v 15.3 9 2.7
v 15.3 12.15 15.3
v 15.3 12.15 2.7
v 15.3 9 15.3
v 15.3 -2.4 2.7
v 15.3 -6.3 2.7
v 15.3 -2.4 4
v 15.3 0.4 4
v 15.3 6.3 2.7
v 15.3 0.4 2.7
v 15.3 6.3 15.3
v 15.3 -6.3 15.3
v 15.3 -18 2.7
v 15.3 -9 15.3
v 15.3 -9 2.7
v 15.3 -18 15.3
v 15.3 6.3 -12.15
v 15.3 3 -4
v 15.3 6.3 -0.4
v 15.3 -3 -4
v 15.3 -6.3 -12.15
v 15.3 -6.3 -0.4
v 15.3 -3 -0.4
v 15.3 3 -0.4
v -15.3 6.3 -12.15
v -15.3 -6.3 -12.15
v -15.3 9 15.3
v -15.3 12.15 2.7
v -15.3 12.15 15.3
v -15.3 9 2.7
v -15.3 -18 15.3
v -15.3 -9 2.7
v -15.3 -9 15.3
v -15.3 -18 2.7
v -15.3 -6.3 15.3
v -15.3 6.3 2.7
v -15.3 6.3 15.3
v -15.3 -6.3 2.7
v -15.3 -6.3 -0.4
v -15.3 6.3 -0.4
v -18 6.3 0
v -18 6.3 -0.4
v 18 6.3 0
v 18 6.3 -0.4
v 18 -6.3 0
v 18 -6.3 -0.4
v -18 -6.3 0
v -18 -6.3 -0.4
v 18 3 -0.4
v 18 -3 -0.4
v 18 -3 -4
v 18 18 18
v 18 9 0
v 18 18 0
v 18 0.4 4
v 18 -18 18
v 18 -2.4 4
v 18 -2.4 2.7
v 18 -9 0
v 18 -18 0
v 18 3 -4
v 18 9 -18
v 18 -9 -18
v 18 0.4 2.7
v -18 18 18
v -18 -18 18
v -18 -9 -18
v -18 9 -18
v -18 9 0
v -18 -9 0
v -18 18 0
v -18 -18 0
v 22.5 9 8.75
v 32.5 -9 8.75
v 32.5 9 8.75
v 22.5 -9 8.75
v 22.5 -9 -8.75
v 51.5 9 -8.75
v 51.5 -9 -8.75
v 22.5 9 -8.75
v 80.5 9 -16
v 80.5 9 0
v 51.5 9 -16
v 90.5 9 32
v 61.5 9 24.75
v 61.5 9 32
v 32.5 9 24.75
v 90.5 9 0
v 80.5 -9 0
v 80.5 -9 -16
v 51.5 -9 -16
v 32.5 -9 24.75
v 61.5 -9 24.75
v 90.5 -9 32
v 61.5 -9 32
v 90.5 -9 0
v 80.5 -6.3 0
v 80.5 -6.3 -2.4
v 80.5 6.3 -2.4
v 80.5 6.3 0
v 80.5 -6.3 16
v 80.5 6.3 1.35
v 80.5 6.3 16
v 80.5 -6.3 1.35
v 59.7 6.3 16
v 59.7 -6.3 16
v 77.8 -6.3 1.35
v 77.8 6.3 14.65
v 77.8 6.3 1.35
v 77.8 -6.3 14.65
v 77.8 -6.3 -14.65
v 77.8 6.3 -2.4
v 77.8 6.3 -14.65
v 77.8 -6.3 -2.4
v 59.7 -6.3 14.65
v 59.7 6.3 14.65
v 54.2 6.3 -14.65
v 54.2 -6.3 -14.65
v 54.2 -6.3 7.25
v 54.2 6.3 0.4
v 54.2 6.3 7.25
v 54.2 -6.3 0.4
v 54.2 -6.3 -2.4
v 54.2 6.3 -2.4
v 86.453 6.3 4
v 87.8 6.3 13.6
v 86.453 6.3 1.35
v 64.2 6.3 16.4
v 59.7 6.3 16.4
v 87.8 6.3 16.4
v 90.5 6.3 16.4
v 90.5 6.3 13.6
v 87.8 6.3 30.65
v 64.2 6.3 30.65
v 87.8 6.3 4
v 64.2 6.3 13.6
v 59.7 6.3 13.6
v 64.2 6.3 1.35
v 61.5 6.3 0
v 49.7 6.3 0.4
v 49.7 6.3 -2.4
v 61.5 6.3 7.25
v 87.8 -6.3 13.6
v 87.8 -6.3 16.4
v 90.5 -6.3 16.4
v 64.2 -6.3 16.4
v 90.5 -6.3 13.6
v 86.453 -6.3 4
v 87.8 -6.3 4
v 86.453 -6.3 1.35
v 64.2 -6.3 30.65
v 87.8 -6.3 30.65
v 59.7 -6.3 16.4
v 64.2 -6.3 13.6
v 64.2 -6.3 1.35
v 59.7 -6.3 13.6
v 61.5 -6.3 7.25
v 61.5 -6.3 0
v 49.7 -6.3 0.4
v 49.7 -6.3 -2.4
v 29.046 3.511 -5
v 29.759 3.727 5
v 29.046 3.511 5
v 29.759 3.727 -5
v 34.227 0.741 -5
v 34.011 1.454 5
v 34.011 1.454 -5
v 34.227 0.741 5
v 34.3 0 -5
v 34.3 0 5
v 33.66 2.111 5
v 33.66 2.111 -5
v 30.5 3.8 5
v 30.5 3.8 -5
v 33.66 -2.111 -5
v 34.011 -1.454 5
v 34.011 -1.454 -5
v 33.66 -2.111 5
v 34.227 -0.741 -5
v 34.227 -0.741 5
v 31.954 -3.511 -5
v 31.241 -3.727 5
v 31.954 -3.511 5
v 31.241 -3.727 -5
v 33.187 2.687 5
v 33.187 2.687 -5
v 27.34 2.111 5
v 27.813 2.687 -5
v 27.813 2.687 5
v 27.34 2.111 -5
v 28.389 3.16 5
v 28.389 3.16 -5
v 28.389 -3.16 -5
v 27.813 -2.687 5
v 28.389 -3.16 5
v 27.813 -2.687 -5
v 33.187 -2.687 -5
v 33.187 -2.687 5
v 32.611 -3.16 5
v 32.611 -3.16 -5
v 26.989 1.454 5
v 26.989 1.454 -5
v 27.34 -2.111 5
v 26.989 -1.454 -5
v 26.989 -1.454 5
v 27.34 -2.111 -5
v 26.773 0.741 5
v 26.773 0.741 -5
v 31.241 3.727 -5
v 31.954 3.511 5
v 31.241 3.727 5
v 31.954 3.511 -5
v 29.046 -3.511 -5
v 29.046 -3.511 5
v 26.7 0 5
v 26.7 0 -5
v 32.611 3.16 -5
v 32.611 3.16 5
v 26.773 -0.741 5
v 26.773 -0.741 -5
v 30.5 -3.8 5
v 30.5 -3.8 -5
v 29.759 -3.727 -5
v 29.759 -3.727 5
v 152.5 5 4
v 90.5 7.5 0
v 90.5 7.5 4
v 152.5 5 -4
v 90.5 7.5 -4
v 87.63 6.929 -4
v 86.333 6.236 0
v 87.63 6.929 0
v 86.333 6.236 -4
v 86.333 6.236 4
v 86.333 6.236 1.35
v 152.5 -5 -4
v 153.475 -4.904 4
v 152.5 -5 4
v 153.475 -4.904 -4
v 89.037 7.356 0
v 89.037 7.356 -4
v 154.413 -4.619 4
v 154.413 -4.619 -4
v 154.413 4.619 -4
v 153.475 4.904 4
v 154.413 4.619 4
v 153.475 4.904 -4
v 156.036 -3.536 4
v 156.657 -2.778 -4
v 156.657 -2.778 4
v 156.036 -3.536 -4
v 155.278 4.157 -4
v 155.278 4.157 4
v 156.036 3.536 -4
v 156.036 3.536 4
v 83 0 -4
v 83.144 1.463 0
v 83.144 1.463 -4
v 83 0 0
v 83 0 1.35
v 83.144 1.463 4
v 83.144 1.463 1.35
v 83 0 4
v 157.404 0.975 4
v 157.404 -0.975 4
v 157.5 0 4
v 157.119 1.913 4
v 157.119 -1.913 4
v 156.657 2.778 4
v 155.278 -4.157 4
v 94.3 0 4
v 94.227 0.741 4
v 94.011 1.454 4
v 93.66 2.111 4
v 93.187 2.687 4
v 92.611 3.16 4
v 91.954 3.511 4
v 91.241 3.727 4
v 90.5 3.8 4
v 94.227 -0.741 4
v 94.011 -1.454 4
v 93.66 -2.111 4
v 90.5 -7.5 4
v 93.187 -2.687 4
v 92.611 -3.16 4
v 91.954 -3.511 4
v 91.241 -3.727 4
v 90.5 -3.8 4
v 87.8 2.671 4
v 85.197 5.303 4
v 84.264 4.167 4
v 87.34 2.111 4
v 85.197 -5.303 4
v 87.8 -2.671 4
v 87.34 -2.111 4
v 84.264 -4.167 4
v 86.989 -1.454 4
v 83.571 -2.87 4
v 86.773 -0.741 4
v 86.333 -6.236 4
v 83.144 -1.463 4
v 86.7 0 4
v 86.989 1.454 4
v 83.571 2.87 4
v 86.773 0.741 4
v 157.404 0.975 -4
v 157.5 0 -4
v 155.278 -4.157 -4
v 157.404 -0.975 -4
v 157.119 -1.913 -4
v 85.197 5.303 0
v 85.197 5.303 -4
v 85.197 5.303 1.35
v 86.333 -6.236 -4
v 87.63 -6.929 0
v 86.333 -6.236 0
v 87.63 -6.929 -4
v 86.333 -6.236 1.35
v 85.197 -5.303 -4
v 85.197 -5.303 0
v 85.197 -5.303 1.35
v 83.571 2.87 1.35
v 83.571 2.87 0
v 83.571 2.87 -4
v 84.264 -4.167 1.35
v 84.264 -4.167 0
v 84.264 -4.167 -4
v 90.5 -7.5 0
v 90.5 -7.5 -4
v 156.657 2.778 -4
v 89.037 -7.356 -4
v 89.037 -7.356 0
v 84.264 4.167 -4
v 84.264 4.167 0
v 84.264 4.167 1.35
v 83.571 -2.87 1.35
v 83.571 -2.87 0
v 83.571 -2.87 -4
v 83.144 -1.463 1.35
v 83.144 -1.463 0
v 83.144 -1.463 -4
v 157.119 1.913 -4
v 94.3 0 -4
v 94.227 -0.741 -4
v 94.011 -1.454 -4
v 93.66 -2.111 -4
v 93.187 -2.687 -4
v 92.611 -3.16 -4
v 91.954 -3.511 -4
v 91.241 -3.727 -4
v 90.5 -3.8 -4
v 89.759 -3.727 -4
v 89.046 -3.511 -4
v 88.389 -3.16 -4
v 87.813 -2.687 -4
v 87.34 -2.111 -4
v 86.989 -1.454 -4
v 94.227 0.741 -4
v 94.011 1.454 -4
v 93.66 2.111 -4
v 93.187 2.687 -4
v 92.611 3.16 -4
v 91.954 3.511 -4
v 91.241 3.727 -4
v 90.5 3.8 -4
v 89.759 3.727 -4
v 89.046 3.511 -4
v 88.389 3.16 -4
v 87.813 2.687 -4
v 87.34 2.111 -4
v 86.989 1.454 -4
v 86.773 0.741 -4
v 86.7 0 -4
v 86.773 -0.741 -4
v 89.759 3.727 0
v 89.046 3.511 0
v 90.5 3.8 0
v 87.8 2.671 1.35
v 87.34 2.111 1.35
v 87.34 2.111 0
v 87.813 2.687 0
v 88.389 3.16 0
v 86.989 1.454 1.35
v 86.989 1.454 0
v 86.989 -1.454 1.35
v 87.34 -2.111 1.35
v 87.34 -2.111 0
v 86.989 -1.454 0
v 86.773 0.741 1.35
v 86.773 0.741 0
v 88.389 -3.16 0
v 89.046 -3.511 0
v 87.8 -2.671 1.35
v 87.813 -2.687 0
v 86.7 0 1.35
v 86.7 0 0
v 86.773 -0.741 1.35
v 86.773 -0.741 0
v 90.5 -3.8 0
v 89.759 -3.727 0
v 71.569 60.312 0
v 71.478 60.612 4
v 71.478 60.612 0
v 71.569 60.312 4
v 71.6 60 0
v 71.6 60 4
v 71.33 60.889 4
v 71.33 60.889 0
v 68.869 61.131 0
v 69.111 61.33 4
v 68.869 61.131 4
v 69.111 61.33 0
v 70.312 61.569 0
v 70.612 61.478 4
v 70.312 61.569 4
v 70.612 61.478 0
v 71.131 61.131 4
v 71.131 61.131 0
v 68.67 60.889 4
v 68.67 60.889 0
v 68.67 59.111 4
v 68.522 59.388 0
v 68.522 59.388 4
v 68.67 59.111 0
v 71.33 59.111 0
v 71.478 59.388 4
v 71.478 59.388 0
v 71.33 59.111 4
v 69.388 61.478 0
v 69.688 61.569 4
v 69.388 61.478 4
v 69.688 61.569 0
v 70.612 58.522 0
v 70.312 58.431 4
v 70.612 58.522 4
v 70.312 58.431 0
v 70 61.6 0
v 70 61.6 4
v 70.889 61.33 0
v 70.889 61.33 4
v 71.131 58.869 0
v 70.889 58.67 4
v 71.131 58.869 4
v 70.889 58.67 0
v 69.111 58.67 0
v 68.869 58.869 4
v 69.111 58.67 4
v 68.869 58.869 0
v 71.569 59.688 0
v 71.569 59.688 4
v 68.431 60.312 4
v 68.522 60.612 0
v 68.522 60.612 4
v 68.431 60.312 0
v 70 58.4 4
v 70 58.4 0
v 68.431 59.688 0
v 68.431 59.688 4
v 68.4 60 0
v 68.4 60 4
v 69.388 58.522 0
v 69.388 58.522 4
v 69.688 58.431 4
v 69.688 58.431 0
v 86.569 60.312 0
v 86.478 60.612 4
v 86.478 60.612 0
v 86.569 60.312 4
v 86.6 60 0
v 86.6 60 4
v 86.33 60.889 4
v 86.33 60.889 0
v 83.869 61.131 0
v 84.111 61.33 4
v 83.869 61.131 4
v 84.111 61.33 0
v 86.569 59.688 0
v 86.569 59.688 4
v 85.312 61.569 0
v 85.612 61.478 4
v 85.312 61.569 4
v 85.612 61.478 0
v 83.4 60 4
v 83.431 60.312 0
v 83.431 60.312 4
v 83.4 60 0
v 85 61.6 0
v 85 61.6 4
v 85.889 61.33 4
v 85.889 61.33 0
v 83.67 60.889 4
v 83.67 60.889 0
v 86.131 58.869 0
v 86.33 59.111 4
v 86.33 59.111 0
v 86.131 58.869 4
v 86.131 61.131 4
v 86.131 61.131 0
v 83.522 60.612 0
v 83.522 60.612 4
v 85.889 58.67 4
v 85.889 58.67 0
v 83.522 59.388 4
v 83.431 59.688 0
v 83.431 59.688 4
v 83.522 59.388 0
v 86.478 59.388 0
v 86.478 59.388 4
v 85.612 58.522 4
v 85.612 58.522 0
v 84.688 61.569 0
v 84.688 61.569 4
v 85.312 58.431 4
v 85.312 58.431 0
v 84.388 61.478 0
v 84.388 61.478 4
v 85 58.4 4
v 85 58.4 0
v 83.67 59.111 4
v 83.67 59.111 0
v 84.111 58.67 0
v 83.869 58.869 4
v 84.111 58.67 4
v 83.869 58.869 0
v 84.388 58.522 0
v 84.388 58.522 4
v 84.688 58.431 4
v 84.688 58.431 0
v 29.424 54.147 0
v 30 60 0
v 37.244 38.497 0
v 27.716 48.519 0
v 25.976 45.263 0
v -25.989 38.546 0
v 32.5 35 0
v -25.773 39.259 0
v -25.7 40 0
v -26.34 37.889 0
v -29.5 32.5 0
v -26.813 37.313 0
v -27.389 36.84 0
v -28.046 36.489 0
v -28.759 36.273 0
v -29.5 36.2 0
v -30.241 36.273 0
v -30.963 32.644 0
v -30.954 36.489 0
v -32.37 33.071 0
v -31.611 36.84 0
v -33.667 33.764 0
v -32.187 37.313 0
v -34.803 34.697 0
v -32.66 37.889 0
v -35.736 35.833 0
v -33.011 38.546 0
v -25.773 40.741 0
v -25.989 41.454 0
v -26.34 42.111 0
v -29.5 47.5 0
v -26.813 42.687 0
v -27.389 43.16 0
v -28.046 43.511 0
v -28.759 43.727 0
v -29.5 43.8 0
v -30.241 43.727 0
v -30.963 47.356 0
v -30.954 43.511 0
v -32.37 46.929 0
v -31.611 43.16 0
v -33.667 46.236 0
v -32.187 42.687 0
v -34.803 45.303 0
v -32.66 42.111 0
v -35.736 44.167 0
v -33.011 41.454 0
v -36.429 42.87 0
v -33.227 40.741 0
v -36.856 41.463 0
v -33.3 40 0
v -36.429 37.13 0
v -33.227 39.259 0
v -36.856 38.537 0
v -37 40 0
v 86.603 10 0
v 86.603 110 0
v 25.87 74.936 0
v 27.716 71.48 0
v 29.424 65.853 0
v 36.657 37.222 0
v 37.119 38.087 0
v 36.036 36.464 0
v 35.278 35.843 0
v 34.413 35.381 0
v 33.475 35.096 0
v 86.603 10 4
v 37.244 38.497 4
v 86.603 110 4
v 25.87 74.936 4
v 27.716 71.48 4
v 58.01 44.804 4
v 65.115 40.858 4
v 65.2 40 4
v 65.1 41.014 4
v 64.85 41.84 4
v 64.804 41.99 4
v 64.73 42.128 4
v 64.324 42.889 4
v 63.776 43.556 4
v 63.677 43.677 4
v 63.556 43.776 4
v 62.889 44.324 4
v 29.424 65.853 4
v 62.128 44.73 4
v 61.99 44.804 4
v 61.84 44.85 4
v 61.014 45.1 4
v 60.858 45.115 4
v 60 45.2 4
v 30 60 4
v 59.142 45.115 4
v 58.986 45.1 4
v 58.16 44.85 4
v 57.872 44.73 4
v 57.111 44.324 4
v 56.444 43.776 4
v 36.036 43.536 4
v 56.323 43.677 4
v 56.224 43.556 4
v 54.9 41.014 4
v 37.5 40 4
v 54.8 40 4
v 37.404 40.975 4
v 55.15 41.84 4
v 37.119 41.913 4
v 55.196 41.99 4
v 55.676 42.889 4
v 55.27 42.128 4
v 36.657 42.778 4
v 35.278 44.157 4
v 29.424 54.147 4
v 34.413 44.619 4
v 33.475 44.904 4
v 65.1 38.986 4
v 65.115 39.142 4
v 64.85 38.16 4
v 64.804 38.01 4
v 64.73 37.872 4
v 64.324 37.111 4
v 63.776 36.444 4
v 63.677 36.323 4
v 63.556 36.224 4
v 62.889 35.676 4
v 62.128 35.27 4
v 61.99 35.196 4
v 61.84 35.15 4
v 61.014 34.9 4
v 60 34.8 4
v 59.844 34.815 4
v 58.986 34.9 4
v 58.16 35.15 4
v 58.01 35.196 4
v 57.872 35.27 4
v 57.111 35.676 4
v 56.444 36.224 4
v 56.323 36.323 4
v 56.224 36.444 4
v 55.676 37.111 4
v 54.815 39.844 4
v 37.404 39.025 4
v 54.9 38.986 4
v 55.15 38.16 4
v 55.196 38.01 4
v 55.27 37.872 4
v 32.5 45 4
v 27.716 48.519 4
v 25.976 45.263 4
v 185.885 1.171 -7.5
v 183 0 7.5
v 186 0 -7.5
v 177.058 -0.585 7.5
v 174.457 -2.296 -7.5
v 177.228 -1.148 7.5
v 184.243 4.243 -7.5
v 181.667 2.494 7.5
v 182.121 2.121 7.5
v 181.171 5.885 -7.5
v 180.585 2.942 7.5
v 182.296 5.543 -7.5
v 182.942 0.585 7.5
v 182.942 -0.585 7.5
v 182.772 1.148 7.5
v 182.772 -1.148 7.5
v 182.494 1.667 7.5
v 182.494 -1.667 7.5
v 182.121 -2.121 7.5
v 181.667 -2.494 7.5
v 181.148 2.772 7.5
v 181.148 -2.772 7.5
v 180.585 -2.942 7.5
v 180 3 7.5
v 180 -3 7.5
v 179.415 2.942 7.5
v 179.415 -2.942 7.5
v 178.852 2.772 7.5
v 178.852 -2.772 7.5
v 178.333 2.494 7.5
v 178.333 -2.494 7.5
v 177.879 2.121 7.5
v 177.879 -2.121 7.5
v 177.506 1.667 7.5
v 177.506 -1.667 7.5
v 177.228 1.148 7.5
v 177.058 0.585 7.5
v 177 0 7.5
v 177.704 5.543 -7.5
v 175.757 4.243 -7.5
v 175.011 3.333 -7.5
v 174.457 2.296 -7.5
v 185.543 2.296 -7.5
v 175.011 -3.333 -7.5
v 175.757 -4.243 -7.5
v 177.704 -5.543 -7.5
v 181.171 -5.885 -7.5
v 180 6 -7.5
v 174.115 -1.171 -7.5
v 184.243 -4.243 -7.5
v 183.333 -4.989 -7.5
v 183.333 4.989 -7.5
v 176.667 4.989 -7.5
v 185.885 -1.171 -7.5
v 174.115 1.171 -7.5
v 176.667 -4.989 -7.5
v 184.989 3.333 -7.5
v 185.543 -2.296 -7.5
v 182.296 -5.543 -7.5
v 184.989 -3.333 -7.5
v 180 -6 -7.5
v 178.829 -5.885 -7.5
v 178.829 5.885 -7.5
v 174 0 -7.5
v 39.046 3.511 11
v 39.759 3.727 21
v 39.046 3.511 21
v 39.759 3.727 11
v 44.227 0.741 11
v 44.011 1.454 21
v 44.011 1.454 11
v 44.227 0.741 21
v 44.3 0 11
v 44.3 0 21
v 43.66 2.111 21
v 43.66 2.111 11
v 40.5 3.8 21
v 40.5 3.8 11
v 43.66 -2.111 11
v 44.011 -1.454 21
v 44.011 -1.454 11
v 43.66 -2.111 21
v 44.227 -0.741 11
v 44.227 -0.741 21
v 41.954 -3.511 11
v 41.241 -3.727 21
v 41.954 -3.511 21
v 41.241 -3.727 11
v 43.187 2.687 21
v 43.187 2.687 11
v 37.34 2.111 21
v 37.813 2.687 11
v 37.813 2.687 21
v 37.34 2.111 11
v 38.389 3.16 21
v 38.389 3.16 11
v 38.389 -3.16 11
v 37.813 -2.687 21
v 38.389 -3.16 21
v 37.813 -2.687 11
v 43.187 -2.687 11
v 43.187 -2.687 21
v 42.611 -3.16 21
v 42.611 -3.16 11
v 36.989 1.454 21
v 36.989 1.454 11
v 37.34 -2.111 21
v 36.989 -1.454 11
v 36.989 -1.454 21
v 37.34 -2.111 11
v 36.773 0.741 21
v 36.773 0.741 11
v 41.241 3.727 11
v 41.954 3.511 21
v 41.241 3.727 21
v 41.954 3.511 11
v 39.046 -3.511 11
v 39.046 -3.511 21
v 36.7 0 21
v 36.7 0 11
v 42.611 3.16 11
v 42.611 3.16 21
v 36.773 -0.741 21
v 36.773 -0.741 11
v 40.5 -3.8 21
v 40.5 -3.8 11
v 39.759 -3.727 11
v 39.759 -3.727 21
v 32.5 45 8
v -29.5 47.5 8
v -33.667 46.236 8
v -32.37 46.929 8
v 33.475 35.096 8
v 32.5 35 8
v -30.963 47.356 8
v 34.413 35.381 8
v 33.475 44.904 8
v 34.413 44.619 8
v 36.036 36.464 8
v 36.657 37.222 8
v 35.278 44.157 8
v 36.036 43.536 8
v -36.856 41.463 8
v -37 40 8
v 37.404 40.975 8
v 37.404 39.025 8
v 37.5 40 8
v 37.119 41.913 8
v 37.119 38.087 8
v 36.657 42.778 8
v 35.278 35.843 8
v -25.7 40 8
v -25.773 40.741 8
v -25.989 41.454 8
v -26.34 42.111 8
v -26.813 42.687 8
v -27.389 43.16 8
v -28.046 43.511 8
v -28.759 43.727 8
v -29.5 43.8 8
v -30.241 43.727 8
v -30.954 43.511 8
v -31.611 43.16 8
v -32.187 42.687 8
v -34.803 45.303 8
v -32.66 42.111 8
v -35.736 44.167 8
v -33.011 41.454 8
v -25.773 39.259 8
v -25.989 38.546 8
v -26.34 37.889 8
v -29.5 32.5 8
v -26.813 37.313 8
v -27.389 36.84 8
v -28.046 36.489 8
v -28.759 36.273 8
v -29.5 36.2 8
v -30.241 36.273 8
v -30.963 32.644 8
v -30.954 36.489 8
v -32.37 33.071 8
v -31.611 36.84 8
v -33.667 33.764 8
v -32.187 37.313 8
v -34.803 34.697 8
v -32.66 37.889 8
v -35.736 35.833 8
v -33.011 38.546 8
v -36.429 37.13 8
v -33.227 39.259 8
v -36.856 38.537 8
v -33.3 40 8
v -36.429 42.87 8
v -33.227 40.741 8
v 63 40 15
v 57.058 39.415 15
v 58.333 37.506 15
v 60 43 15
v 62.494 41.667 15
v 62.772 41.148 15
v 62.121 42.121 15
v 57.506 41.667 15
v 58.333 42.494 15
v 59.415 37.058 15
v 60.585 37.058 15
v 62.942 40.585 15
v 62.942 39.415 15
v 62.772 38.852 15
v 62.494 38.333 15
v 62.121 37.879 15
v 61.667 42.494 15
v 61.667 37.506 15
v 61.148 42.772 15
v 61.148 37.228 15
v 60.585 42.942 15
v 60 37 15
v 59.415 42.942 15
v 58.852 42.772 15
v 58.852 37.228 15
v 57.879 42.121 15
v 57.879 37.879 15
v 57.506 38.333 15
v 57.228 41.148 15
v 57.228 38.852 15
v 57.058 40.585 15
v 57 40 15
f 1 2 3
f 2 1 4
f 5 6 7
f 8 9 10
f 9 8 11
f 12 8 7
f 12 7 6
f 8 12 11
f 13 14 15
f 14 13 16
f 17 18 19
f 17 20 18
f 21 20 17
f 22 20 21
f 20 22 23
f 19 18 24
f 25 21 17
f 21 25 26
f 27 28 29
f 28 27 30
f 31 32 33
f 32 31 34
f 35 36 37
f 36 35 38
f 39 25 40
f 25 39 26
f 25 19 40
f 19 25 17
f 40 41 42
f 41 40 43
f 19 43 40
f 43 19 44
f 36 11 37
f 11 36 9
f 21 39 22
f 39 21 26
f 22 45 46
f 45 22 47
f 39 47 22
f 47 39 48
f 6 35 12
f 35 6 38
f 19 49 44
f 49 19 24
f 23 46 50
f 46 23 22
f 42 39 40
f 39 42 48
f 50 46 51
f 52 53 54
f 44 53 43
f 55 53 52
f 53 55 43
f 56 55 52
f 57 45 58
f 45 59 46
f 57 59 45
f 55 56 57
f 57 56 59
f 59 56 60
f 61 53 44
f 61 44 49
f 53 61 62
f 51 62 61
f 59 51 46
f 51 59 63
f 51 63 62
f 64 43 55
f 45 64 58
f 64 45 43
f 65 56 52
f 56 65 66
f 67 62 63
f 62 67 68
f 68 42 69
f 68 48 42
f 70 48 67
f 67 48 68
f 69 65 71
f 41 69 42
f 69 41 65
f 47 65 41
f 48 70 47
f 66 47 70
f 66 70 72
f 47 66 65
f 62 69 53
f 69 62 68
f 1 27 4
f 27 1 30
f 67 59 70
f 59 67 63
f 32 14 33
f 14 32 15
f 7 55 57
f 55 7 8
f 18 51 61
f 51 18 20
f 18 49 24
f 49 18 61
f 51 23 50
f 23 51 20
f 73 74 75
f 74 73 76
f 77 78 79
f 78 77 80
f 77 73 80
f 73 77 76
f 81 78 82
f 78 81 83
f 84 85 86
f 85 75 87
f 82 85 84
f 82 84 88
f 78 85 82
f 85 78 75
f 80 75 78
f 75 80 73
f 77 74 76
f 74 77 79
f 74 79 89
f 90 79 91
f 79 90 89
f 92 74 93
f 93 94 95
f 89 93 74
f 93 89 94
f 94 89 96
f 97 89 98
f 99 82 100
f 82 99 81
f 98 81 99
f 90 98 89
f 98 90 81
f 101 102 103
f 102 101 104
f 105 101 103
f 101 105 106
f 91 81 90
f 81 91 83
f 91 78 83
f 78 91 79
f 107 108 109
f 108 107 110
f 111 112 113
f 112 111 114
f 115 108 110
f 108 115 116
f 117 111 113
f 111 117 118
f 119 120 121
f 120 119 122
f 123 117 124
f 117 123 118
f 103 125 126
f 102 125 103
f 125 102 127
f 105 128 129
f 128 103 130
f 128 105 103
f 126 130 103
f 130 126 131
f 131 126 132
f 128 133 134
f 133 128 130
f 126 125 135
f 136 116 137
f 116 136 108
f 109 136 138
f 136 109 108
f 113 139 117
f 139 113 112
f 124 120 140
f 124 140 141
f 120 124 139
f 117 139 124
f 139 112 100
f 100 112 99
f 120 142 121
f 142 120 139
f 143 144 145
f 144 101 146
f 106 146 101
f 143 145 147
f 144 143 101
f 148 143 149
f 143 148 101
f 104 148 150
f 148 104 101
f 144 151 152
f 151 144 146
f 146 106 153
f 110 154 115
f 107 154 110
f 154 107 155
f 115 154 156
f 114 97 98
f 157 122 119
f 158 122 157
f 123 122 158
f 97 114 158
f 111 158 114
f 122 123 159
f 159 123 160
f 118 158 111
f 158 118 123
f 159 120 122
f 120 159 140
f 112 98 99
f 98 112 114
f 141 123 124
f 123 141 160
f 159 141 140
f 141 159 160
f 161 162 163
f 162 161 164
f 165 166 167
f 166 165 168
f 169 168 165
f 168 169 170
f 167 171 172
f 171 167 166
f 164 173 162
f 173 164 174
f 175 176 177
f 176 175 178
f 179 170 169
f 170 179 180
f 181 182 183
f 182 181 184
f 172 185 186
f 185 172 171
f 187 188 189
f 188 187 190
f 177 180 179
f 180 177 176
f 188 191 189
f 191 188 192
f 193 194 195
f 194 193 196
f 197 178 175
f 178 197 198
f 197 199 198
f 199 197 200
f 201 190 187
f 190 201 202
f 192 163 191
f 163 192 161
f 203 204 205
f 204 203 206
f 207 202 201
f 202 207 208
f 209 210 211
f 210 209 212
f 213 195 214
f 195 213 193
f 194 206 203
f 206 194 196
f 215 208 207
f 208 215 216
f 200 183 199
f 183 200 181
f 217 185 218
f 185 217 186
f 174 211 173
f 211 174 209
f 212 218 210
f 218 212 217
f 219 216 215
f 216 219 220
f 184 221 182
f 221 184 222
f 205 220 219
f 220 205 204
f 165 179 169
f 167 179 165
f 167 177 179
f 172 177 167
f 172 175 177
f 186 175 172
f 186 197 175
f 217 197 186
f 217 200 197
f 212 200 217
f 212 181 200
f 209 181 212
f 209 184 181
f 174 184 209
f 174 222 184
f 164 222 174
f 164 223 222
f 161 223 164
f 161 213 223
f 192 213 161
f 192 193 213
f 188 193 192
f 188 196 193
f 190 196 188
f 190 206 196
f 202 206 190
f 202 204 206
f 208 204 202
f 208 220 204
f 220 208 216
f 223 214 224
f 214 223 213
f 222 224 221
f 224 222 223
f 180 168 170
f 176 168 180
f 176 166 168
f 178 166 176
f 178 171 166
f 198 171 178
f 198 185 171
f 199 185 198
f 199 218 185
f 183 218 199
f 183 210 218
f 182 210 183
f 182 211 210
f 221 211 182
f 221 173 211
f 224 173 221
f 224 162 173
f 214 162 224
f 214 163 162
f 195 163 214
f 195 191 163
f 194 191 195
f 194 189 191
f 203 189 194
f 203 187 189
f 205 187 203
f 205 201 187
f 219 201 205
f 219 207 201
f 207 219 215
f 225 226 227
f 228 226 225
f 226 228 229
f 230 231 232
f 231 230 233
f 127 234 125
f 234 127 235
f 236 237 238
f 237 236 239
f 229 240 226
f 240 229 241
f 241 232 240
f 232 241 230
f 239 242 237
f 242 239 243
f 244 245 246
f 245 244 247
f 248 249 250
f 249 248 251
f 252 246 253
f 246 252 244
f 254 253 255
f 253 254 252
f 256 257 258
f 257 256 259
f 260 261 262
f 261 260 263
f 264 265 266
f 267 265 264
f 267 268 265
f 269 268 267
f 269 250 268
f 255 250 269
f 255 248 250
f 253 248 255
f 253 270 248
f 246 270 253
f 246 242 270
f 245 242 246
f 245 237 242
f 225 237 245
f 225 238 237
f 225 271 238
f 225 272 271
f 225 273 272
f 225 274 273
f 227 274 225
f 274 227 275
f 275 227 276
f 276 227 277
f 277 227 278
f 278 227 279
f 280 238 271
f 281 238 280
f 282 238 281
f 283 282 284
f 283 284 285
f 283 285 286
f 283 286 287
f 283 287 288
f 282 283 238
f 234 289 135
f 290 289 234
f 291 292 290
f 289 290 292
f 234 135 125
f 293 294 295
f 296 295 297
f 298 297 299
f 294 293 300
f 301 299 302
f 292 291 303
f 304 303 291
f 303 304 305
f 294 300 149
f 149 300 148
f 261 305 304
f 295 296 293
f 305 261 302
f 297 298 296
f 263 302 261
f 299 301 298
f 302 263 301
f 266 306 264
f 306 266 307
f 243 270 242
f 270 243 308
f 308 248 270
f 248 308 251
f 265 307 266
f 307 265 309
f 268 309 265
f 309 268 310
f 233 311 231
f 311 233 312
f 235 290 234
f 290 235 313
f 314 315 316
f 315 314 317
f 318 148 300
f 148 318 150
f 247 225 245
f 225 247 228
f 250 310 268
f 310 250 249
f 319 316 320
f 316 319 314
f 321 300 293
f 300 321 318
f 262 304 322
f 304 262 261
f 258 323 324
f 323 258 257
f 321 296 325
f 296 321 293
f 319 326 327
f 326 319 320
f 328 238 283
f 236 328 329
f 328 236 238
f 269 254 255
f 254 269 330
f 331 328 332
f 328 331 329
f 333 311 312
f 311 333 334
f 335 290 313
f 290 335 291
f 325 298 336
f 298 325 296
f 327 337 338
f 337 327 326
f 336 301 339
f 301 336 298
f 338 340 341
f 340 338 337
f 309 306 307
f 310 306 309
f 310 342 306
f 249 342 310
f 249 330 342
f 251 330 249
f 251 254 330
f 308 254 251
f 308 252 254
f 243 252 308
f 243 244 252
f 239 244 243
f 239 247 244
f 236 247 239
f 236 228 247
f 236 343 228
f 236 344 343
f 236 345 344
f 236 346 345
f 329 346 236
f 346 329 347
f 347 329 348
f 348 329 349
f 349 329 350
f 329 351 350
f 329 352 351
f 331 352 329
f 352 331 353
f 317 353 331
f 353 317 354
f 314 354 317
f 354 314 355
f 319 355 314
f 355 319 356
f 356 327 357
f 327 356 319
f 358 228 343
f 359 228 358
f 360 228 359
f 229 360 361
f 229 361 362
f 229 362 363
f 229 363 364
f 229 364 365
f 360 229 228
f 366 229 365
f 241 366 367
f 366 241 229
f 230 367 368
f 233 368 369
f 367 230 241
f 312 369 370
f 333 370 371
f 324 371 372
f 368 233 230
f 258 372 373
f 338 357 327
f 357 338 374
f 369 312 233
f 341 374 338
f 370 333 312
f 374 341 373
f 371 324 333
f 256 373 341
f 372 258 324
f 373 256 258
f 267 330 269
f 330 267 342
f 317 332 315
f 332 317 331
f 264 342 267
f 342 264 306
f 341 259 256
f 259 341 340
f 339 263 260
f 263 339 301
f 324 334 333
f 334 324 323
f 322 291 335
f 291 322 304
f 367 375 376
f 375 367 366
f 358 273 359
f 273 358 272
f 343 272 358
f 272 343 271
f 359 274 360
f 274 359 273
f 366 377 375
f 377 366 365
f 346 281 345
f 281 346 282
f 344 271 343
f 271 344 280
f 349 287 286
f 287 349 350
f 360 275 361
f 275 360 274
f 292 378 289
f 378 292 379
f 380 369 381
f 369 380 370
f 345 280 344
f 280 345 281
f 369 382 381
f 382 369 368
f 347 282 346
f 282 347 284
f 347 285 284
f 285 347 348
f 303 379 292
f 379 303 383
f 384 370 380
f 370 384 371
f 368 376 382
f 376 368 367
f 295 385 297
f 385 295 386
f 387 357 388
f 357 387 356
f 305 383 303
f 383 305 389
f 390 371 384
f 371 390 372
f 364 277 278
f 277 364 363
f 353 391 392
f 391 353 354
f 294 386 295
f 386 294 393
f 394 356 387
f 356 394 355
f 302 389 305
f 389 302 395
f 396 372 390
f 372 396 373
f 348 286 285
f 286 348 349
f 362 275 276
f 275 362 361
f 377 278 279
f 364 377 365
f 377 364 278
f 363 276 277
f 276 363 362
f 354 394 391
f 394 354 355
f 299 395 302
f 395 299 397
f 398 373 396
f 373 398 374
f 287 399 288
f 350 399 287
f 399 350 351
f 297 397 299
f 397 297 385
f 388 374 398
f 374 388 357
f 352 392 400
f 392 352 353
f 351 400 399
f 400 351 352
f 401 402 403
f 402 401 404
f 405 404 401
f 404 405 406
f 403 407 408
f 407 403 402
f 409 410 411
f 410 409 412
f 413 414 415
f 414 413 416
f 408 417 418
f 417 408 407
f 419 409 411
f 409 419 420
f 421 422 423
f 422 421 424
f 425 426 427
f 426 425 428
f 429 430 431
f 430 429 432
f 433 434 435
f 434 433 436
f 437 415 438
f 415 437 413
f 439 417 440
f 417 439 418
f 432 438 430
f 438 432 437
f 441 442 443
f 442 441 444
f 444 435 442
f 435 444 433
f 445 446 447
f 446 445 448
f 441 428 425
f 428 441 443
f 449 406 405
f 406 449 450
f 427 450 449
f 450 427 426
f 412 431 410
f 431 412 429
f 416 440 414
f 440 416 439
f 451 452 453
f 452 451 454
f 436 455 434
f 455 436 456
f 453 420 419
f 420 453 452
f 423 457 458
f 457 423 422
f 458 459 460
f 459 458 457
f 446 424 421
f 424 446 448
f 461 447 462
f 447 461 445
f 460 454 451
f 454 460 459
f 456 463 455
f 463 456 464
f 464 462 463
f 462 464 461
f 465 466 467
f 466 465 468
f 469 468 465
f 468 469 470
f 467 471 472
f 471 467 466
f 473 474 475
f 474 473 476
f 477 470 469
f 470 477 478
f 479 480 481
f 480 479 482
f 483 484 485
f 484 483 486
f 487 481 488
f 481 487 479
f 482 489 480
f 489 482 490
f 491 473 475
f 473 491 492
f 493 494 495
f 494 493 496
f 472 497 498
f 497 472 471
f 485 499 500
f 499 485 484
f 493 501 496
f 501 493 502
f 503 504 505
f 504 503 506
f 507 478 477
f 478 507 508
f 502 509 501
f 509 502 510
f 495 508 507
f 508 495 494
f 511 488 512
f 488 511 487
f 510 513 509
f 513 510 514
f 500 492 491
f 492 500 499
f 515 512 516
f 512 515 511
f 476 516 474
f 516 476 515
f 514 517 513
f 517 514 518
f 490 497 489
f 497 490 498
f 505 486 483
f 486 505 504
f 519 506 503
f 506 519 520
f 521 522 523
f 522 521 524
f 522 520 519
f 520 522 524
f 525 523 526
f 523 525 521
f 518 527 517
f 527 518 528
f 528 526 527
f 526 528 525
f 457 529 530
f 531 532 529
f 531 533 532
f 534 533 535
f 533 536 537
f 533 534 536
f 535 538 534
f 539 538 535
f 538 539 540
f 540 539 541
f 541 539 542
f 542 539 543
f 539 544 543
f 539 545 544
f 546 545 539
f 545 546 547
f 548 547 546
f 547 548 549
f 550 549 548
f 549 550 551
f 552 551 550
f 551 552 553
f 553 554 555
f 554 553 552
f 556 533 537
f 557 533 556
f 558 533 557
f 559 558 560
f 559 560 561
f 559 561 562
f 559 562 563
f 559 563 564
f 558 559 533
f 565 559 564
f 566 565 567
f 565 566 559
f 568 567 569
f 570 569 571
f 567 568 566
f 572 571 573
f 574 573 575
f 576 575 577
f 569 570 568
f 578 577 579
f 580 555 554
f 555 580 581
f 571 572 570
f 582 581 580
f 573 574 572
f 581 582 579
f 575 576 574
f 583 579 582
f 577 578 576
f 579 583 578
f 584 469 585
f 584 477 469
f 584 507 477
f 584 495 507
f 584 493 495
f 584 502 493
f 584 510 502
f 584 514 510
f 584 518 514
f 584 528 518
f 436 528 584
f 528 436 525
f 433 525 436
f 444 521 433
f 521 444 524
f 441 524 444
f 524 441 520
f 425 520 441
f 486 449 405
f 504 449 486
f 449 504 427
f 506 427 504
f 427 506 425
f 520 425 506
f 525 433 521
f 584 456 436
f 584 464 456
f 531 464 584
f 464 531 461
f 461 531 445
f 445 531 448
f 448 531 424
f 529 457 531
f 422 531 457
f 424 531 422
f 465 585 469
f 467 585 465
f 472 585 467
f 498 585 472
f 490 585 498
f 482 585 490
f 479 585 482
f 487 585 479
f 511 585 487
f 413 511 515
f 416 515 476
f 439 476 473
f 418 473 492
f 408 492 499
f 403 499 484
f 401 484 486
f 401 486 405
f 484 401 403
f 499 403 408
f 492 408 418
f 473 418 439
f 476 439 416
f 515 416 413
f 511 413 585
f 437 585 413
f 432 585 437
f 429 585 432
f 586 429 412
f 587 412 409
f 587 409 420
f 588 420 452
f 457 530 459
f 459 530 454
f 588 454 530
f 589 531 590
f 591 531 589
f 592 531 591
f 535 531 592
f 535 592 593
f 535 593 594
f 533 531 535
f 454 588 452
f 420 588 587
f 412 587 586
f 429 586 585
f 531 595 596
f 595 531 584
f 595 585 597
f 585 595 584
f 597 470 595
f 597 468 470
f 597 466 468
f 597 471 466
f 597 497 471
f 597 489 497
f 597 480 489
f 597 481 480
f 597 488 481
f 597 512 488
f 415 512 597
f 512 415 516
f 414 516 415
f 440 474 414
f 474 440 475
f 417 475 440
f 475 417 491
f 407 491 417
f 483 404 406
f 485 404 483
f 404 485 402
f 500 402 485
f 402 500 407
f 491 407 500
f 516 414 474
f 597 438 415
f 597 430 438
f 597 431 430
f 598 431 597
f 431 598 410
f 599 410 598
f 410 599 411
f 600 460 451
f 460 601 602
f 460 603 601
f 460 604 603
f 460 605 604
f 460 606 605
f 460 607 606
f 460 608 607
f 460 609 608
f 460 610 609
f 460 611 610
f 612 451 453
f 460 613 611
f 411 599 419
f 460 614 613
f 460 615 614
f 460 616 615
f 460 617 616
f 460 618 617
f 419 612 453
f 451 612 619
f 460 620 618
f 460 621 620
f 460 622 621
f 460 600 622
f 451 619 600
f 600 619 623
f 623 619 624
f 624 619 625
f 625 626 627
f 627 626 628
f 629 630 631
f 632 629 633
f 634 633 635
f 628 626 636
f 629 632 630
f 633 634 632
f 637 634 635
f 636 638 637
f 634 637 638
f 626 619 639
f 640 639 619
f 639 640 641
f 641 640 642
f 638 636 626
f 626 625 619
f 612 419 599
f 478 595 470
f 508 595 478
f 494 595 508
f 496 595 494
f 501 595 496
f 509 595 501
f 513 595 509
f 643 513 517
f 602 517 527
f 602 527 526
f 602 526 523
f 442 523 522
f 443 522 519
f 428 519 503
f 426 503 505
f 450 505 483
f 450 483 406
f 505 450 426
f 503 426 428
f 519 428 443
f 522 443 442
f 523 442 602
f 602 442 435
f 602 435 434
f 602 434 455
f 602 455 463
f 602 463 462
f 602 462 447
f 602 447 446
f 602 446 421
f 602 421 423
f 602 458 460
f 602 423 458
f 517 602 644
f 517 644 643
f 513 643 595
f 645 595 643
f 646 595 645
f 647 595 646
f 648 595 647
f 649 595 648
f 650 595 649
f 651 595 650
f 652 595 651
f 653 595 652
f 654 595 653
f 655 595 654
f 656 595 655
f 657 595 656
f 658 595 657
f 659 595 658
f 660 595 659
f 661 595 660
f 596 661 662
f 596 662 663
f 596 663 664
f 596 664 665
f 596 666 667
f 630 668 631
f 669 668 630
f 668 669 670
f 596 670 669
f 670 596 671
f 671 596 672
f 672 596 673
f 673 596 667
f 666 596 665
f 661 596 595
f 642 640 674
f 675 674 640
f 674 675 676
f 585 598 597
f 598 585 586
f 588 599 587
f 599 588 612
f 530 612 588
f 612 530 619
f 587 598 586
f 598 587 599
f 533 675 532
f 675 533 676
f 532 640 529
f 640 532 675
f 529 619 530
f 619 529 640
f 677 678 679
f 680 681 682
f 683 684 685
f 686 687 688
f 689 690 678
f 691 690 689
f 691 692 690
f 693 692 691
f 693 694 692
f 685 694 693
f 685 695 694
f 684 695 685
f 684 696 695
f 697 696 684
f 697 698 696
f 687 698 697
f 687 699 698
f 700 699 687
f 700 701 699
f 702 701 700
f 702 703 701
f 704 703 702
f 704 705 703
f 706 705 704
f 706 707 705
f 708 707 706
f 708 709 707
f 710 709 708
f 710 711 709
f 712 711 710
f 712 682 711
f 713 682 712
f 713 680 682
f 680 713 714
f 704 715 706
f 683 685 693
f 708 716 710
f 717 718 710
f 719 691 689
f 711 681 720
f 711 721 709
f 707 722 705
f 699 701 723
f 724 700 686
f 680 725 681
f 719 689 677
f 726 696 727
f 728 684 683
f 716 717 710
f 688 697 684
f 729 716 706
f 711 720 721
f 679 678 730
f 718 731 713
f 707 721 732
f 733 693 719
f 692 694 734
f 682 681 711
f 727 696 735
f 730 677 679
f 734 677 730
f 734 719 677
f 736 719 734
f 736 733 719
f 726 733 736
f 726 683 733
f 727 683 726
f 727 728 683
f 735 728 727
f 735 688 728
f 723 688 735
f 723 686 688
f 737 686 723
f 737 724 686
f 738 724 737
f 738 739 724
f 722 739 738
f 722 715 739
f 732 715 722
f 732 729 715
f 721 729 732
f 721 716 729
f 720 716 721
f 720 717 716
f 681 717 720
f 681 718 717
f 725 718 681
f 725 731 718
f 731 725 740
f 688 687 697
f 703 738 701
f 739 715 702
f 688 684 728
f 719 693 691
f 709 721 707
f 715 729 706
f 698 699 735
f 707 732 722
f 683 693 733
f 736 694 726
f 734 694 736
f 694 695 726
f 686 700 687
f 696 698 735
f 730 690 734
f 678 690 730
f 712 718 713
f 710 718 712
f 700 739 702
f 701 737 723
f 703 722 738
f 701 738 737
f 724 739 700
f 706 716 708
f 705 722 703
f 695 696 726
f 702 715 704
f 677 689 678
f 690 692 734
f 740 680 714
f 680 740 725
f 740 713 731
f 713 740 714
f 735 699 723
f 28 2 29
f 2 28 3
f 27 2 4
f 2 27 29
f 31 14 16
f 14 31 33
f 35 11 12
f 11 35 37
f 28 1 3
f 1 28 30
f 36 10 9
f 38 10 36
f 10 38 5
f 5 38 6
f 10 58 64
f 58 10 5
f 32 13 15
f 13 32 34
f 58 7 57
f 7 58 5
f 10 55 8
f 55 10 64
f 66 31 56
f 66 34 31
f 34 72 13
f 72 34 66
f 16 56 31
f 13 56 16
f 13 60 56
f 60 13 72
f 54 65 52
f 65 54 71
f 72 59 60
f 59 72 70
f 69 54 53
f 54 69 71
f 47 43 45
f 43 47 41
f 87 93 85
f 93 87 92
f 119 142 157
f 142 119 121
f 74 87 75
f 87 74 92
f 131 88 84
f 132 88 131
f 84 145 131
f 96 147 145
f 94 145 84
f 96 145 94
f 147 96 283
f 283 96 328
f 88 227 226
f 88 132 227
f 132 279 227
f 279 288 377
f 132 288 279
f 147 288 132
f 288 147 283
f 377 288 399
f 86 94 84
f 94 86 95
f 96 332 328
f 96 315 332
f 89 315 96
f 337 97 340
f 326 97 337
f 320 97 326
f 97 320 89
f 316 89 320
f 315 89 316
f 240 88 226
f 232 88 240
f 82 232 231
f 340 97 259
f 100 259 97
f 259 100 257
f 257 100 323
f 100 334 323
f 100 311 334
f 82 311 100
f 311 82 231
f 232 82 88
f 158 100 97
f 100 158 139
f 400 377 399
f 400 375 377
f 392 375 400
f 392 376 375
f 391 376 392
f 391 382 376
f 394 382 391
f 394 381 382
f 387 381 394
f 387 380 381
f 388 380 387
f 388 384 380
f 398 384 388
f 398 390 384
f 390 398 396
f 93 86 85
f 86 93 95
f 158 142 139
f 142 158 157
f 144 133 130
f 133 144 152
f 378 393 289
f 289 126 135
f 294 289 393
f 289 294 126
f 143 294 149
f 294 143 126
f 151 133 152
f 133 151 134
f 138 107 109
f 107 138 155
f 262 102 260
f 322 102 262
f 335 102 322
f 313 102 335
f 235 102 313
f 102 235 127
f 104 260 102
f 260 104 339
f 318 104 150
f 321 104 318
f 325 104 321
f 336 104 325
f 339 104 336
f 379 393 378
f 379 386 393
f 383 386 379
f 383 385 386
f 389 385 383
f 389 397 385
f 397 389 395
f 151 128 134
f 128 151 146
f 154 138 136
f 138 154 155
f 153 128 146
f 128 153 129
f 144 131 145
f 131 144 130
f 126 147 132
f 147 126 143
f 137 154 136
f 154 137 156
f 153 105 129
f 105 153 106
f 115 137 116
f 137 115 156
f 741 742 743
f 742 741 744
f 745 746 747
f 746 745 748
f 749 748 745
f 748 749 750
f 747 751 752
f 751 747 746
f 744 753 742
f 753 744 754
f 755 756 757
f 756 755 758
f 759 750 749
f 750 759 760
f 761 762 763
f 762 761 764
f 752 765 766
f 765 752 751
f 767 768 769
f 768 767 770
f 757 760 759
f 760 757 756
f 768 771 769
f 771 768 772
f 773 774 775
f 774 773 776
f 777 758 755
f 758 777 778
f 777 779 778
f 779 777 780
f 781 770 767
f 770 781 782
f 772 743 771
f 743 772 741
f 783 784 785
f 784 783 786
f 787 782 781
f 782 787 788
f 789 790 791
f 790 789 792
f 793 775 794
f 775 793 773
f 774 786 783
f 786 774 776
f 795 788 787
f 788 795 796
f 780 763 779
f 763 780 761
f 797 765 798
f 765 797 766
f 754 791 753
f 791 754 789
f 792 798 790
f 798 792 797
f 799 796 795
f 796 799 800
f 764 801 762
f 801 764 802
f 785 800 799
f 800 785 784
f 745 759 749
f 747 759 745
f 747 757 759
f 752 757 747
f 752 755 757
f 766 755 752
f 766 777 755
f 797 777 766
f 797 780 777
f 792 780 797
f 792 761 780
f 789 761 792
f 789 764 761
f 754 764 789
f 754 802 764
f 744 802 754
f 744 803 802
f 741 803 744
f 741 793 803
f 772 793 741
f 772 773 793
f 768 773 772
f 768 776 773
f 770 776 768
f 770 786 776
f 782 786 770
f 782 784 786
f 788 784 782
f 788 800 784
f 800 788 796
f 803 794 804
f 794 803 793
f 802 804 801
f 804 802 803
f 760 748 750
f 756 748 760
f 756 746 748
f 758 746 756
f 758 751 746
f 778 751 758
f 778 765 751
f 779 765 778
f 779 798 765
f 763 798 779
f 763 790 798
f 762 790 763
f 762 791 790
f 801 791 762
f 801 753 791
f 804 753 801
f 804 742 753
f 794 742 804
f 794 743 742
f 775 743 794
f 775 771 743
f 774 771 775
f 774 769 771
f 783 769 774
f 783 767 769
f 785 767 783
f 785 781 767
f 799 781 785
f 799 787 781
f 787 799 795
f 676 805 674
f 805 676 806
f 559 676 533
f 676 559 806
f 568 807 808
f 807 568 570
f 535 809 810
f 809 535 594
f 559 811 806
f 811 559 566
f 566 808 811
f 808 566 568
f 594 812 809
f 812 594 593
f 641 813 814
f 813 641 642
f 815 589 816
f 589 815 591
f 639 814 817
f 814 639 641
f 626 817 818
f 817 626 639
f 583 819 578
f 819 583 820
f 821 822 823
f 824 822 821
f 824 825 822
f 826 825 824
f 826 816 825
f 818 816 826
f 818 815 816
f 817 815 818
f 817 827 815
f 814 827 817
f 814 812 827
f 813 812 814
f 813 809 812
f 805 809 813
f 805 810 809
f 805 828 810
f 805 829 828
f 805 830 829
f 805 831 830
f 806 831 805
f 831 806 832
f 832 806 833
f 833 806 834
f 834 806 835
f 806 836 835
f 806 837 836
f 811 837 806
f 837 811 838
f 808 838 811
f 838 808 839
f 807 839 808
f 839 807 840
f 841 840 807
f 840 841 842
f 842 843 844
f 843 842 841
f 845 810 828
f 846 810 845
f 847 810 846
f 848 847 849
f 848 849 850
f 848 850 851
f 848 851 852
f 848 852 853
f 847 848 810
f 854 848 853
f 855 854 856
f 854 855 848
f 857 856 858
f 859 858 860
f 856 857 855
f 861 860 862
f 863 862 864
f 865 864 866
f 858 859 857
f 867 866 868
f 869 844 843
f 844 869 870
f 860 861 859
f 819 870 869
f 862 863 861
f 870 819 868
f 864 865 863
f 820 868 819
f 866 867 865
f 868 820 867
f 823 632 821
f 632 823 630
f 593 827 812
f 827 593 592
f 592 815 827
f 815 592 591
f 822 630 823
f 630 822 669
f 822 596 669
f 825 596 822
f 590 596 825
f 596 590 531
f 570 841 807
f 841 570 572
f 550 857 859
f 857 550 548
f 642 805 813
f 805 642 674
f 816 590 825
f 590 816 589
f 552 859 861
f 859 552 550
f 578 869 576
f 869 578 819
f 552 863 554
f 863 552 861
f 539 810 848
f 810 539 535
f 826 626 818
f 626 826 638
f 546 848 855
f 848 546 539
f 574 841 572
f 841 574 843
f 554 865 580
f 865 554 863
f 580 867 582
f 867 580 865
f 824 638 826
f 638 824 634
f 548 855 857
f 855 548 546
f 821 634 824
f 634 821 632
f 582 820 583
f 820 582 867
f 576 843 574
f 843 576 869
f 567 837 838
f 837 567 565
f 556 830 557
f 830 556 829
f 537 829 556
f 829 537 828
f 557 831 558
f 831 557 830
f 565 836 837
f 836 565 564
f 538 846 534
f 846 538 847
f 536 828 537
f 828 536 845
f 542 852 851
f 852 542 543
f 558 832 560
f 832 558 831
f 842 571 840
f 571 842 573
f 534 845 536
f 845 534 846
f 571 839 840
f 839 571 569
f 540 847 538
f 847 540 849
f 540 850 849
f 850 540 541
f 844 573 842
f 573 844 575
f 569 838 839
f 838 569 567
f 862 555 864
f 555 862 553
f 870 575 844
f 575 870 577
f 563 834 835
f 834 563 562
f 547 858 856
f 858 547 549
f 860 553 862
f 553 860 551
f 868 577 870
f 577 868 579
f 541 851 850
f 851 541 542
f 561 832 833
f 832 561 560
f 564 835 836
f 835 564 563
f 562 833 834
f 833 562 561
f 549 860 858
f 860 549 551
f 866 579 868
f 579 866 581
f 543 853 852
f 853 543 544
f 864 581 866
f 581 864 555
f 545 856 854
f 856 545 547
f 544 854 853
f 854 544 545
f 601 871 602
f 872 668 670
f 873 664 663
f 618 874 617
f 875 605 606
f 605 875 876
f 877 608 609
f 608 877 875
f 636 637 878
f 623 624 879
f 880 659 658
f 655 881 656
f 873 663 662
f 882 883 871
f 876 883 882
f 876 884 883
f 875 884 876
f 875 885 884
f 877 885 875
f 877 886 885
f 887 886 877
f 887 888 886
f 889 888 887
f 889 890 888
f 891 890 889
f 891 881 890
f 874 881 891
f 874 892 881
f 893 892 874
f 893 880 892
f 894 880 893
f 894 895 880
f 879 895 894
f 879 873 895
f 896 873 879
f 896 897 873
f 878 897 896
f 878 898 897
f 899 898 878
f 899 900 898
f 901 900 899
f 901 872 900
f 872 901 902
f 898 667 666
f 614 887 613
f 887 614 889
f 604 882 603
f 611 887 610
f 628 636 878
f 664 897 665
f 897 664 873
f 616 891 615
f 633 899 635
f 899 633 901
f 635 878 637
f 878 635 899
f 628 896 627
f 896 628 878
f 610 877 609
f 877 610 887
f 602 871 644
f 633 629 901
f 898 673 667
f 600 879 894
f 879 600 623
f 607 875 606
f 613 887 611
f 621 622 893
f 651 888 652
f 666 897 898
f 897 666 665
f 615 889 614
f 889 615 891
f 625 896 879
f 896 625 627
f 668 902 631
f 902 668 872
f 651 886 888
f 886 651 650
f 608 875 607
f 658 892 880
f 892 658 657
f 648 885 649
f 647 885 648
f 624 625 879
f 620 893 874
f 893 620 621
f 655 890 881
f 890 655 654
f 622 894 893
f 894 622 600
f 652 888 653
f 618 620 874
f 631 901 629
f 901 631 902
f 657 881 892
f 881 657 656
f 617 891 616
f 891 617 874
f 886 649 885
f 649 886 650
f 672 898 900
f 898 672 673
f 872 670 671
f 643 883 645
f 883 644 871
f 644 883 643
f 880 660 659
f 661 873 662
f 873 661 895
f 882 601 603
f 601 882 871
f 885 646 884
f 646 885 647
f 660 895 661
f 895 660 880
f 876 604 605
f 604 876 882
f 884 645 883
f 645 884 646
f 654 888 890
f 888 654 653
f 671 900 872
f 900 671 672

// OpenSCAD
// file: leg.scad
// Hexapod Leg - Parametric OpenSCAD Design
// Designed for SG90 (femur/tibia) and HS-82MG (coxa) servos

/* [Servo Dimensions] */
// SG90 micro servo
sg90_width = 12;
sg90_length = 23;
sg90_height = 29;
sg90_shaft_height = 4;
sg90_ear_width = 32;
sg90_ear_thickness = 2.5;
sg90_ear_offset = 15.5;  // from bottom

// HS-82MG servo (slightly larger)
hs82_width = 12;
hs82_length = 30;
hs82_height = 30;
hs82_shaft_height = 4;
hs82_ear_width = 40;
hs82_ear_thickness = 2.5;
hs82_ear_offset = 17;

/* [Leg Dimensions] */
coxa_length = 25;
femur_length = 55;
tibia_length = 75;
wall_thickness = 3;
clearance = 0.3;  // printer tolerance

/* [Rendering] */
$fn = 32;

// Servo pocket module (for embedding servo)
module servo_pocket(type="sg90") {
    w = (type == "sg90") ? sg90_width : hs82_width;
    l = (type == "sg90") ? sg90_length : hs82_length;
    h = (type == "sg90") ? sg90_height : hs82_height;
    ear_w = (type == "sg90") ? sg90_ear_width : hs82_ear_width;
    ear_t = (type == "sg90") ? sg90_ear_thickness : hs82_ear_thickness;
    ear_off = (type == "sg90") ? sg90_ear_offset : hs82_ear_offset;

    c = clearance;

    union() {
        // Main body
        cube([l + c*2, w + c*2, h + c], center=true);
        // Mounting ears
        translate([0, 0, h/2 - ear_off])
            cube([ear_w + c*2, w + c*2, ear_t + c], center=true);
    }
}

// Horn/shaft hole
module shaft_hole(d=7, h=10) {
    cylinder(d=d + clearance*2, h=h, center=true);
}

// Coxa bracket - mounts HS-82MG for hip rotation
module coxa_bracket() {
    bracket_h = hs82_height + wall_thickness * 2;
    bracket_w = hs82_width + wall_thickness * 2;
    bracket_l = hs82_length + wall_thickness * 2;

    difference() {
        // Outer shell
        cube([bracket_l, bracket_w, bracket_h], center=true);

        // Servo pocket
        translate([0, 0, wall_thickness])
            servo_pocket("hs82");

        // Shaft hole (top)
        translate([0, 0, bracket_h/2 - 2])
            shaft_hole();

        // Wire channel
        translate([bracket_l/2, 0, 0])
            cube([wall_thickness*2, 6, 8], center=true);
    }
}

// Femur link - connects coxa to tibia
module femur_link() {
    link_w = sg90_width + wall_thickness * 2;
    link_h = sg90_height/2 + wall_thickness;

    difference() {
        union() {
            // Main beam
            cube([femur_length, link_w, link_h], center=true);

            // Servo mount end
            translate([femur_length/2 - sg90_length/2, 0, 0])
                cube([sg90_length + wall_thickness*2, link_w, sg90_height + wall_thickness], center=true);
        }

        // Servo pocket at end
        translate([femur_length/2 - sg90_length/2, 0, 0])
            servo_pocket("sg90");

        // Horn attachment hole (other end)
        translate([-femur_length/2 + 8, 0, 0])
            shaft_hole();
    }
}

// Tibia link - lower leg segment
module tibia_link() {
    link_w = 15;
    link_h = 8;

    difference() {
        union() {
            // Main beam
            hull() {
                translate([-tibia_length/2 + 8, 0, 0])
                    cylinder(d=link_w, h=link_h, center=true);
                translate([tibia_length/2 - 5, 0, 0])
                    cylinder(d=10, h=link_h, center=true);
            }
        }

        // Horn attachment hole
        translate([-tibia_length/2 + 8, 0, 0])
            shaft_hole();
    }
}

// Foot tip (print in TPU for grip)
module foot_tip() {
    cylinder(d1=12, d2=6, h=15, center=true);
}

// Body mount plate (1/6 segment)
module body_segment() {
    seg_angle = 60;
    inner_r = 30;
    outer_r = 100;
    thickness = 4;

    difference() {
        // Wedge shape
        linear_extrude(height=thickness)
            polygon([
                [0, 0],
                [outer_r * cos(seg_angle/2), outer_r * sin(seg_angle/2)],
                [outer_r * cos(-seg_angle/2), outer_r * sin(-seg_angle/2)]
            ]);

        // Inner cutout
        translate([0, 0, -1])
            cylinder(r=inner_r, h=thickness+2);

        // Coxa mount holes
        translate([70, 0, -1]) {
            cylinder(d=3.2, h=thickness+2);
            translate([15, 0, 0])
                cylinder(d=3.2, h=thickness+2);
        }
    }
}

// Preview all parts
module preview() {
    color("DarkGray") coxa_bracket();
    color("Gray") translate([50, 0, 0]) femur_link();
    color("LightGray") translate([120, 0, 0]) tibia_link();
    color("Black") translate([180, 0, 0]) foot_tip();
    color("Blue", 0.5) translate([0, 60, 0]) body_segment();
}

// Uncomment to render individual parts for printing:
// coxa_bracket();
// femur_link();
// tibia_link();
// foot_tip();
// body_segment();

preview();
// main file
// Test Leg Print - One complete leg for fit testing
// Print this first before committing to all 6 legs
//
// PRINT SETTINGS:
//   Material: PLA or PETG
//   Layer height: 0.2mm
//   Infill: 20-30%
//   Supports: YES (for coxa bracket and femur)
//   Bed: 150x150mm minimum
//
// AFTER PRINTING:
//   1. Test fit servos (should slide in snugly)
//   2. Check horn shaft holes (7mm diameter)
//   3. Verify wall thickness is adequate
//   4. Adjust 'clearance' variable if too tight/loose

include <leg.scad>

// Arrange parts for printing on bed
module test_leg_plate() {
    // Coxa bracket - needs supports, print upright
    translate([0, 0, 0])
        coxa_bracket();

    // Femur link - print on side for strength
    translate([50, 0, sg90_height/2 + wall_thickness/2])
        rotate([90, 0, 0])
            femur_link();

    // Tibia link - simple, flat print
    translate([0, 50, 4])
        tibia_link();

    // Foot tip - optional, can print in TPU later
    translate([60, 50, 7.5])
        foot_tip();
}

// Alternative: Parts laid flat (less supports needed)
module test_leg_flat() {
    // Coxa bracket on its side
    translate([0, 0, (hs82_width + wall_thickness*2)/2])
        rotate([90, 0, 0])
            coxa_bracket();

    // Femur link flat
    translate([60, 0, (sg90_height + wall_thickness)/2])
        femur_link();

    // Tibia link
    translate([0, 40, 4])
        tibia_link();

    // Foot
    translate([60, 40, 7.5])
        foot_tip();
}

// CHOOSE ONE:
// test_leg_plate();   // Standard orientation with supports
test_leg_flat();       // Flat orientation, minimal supports
